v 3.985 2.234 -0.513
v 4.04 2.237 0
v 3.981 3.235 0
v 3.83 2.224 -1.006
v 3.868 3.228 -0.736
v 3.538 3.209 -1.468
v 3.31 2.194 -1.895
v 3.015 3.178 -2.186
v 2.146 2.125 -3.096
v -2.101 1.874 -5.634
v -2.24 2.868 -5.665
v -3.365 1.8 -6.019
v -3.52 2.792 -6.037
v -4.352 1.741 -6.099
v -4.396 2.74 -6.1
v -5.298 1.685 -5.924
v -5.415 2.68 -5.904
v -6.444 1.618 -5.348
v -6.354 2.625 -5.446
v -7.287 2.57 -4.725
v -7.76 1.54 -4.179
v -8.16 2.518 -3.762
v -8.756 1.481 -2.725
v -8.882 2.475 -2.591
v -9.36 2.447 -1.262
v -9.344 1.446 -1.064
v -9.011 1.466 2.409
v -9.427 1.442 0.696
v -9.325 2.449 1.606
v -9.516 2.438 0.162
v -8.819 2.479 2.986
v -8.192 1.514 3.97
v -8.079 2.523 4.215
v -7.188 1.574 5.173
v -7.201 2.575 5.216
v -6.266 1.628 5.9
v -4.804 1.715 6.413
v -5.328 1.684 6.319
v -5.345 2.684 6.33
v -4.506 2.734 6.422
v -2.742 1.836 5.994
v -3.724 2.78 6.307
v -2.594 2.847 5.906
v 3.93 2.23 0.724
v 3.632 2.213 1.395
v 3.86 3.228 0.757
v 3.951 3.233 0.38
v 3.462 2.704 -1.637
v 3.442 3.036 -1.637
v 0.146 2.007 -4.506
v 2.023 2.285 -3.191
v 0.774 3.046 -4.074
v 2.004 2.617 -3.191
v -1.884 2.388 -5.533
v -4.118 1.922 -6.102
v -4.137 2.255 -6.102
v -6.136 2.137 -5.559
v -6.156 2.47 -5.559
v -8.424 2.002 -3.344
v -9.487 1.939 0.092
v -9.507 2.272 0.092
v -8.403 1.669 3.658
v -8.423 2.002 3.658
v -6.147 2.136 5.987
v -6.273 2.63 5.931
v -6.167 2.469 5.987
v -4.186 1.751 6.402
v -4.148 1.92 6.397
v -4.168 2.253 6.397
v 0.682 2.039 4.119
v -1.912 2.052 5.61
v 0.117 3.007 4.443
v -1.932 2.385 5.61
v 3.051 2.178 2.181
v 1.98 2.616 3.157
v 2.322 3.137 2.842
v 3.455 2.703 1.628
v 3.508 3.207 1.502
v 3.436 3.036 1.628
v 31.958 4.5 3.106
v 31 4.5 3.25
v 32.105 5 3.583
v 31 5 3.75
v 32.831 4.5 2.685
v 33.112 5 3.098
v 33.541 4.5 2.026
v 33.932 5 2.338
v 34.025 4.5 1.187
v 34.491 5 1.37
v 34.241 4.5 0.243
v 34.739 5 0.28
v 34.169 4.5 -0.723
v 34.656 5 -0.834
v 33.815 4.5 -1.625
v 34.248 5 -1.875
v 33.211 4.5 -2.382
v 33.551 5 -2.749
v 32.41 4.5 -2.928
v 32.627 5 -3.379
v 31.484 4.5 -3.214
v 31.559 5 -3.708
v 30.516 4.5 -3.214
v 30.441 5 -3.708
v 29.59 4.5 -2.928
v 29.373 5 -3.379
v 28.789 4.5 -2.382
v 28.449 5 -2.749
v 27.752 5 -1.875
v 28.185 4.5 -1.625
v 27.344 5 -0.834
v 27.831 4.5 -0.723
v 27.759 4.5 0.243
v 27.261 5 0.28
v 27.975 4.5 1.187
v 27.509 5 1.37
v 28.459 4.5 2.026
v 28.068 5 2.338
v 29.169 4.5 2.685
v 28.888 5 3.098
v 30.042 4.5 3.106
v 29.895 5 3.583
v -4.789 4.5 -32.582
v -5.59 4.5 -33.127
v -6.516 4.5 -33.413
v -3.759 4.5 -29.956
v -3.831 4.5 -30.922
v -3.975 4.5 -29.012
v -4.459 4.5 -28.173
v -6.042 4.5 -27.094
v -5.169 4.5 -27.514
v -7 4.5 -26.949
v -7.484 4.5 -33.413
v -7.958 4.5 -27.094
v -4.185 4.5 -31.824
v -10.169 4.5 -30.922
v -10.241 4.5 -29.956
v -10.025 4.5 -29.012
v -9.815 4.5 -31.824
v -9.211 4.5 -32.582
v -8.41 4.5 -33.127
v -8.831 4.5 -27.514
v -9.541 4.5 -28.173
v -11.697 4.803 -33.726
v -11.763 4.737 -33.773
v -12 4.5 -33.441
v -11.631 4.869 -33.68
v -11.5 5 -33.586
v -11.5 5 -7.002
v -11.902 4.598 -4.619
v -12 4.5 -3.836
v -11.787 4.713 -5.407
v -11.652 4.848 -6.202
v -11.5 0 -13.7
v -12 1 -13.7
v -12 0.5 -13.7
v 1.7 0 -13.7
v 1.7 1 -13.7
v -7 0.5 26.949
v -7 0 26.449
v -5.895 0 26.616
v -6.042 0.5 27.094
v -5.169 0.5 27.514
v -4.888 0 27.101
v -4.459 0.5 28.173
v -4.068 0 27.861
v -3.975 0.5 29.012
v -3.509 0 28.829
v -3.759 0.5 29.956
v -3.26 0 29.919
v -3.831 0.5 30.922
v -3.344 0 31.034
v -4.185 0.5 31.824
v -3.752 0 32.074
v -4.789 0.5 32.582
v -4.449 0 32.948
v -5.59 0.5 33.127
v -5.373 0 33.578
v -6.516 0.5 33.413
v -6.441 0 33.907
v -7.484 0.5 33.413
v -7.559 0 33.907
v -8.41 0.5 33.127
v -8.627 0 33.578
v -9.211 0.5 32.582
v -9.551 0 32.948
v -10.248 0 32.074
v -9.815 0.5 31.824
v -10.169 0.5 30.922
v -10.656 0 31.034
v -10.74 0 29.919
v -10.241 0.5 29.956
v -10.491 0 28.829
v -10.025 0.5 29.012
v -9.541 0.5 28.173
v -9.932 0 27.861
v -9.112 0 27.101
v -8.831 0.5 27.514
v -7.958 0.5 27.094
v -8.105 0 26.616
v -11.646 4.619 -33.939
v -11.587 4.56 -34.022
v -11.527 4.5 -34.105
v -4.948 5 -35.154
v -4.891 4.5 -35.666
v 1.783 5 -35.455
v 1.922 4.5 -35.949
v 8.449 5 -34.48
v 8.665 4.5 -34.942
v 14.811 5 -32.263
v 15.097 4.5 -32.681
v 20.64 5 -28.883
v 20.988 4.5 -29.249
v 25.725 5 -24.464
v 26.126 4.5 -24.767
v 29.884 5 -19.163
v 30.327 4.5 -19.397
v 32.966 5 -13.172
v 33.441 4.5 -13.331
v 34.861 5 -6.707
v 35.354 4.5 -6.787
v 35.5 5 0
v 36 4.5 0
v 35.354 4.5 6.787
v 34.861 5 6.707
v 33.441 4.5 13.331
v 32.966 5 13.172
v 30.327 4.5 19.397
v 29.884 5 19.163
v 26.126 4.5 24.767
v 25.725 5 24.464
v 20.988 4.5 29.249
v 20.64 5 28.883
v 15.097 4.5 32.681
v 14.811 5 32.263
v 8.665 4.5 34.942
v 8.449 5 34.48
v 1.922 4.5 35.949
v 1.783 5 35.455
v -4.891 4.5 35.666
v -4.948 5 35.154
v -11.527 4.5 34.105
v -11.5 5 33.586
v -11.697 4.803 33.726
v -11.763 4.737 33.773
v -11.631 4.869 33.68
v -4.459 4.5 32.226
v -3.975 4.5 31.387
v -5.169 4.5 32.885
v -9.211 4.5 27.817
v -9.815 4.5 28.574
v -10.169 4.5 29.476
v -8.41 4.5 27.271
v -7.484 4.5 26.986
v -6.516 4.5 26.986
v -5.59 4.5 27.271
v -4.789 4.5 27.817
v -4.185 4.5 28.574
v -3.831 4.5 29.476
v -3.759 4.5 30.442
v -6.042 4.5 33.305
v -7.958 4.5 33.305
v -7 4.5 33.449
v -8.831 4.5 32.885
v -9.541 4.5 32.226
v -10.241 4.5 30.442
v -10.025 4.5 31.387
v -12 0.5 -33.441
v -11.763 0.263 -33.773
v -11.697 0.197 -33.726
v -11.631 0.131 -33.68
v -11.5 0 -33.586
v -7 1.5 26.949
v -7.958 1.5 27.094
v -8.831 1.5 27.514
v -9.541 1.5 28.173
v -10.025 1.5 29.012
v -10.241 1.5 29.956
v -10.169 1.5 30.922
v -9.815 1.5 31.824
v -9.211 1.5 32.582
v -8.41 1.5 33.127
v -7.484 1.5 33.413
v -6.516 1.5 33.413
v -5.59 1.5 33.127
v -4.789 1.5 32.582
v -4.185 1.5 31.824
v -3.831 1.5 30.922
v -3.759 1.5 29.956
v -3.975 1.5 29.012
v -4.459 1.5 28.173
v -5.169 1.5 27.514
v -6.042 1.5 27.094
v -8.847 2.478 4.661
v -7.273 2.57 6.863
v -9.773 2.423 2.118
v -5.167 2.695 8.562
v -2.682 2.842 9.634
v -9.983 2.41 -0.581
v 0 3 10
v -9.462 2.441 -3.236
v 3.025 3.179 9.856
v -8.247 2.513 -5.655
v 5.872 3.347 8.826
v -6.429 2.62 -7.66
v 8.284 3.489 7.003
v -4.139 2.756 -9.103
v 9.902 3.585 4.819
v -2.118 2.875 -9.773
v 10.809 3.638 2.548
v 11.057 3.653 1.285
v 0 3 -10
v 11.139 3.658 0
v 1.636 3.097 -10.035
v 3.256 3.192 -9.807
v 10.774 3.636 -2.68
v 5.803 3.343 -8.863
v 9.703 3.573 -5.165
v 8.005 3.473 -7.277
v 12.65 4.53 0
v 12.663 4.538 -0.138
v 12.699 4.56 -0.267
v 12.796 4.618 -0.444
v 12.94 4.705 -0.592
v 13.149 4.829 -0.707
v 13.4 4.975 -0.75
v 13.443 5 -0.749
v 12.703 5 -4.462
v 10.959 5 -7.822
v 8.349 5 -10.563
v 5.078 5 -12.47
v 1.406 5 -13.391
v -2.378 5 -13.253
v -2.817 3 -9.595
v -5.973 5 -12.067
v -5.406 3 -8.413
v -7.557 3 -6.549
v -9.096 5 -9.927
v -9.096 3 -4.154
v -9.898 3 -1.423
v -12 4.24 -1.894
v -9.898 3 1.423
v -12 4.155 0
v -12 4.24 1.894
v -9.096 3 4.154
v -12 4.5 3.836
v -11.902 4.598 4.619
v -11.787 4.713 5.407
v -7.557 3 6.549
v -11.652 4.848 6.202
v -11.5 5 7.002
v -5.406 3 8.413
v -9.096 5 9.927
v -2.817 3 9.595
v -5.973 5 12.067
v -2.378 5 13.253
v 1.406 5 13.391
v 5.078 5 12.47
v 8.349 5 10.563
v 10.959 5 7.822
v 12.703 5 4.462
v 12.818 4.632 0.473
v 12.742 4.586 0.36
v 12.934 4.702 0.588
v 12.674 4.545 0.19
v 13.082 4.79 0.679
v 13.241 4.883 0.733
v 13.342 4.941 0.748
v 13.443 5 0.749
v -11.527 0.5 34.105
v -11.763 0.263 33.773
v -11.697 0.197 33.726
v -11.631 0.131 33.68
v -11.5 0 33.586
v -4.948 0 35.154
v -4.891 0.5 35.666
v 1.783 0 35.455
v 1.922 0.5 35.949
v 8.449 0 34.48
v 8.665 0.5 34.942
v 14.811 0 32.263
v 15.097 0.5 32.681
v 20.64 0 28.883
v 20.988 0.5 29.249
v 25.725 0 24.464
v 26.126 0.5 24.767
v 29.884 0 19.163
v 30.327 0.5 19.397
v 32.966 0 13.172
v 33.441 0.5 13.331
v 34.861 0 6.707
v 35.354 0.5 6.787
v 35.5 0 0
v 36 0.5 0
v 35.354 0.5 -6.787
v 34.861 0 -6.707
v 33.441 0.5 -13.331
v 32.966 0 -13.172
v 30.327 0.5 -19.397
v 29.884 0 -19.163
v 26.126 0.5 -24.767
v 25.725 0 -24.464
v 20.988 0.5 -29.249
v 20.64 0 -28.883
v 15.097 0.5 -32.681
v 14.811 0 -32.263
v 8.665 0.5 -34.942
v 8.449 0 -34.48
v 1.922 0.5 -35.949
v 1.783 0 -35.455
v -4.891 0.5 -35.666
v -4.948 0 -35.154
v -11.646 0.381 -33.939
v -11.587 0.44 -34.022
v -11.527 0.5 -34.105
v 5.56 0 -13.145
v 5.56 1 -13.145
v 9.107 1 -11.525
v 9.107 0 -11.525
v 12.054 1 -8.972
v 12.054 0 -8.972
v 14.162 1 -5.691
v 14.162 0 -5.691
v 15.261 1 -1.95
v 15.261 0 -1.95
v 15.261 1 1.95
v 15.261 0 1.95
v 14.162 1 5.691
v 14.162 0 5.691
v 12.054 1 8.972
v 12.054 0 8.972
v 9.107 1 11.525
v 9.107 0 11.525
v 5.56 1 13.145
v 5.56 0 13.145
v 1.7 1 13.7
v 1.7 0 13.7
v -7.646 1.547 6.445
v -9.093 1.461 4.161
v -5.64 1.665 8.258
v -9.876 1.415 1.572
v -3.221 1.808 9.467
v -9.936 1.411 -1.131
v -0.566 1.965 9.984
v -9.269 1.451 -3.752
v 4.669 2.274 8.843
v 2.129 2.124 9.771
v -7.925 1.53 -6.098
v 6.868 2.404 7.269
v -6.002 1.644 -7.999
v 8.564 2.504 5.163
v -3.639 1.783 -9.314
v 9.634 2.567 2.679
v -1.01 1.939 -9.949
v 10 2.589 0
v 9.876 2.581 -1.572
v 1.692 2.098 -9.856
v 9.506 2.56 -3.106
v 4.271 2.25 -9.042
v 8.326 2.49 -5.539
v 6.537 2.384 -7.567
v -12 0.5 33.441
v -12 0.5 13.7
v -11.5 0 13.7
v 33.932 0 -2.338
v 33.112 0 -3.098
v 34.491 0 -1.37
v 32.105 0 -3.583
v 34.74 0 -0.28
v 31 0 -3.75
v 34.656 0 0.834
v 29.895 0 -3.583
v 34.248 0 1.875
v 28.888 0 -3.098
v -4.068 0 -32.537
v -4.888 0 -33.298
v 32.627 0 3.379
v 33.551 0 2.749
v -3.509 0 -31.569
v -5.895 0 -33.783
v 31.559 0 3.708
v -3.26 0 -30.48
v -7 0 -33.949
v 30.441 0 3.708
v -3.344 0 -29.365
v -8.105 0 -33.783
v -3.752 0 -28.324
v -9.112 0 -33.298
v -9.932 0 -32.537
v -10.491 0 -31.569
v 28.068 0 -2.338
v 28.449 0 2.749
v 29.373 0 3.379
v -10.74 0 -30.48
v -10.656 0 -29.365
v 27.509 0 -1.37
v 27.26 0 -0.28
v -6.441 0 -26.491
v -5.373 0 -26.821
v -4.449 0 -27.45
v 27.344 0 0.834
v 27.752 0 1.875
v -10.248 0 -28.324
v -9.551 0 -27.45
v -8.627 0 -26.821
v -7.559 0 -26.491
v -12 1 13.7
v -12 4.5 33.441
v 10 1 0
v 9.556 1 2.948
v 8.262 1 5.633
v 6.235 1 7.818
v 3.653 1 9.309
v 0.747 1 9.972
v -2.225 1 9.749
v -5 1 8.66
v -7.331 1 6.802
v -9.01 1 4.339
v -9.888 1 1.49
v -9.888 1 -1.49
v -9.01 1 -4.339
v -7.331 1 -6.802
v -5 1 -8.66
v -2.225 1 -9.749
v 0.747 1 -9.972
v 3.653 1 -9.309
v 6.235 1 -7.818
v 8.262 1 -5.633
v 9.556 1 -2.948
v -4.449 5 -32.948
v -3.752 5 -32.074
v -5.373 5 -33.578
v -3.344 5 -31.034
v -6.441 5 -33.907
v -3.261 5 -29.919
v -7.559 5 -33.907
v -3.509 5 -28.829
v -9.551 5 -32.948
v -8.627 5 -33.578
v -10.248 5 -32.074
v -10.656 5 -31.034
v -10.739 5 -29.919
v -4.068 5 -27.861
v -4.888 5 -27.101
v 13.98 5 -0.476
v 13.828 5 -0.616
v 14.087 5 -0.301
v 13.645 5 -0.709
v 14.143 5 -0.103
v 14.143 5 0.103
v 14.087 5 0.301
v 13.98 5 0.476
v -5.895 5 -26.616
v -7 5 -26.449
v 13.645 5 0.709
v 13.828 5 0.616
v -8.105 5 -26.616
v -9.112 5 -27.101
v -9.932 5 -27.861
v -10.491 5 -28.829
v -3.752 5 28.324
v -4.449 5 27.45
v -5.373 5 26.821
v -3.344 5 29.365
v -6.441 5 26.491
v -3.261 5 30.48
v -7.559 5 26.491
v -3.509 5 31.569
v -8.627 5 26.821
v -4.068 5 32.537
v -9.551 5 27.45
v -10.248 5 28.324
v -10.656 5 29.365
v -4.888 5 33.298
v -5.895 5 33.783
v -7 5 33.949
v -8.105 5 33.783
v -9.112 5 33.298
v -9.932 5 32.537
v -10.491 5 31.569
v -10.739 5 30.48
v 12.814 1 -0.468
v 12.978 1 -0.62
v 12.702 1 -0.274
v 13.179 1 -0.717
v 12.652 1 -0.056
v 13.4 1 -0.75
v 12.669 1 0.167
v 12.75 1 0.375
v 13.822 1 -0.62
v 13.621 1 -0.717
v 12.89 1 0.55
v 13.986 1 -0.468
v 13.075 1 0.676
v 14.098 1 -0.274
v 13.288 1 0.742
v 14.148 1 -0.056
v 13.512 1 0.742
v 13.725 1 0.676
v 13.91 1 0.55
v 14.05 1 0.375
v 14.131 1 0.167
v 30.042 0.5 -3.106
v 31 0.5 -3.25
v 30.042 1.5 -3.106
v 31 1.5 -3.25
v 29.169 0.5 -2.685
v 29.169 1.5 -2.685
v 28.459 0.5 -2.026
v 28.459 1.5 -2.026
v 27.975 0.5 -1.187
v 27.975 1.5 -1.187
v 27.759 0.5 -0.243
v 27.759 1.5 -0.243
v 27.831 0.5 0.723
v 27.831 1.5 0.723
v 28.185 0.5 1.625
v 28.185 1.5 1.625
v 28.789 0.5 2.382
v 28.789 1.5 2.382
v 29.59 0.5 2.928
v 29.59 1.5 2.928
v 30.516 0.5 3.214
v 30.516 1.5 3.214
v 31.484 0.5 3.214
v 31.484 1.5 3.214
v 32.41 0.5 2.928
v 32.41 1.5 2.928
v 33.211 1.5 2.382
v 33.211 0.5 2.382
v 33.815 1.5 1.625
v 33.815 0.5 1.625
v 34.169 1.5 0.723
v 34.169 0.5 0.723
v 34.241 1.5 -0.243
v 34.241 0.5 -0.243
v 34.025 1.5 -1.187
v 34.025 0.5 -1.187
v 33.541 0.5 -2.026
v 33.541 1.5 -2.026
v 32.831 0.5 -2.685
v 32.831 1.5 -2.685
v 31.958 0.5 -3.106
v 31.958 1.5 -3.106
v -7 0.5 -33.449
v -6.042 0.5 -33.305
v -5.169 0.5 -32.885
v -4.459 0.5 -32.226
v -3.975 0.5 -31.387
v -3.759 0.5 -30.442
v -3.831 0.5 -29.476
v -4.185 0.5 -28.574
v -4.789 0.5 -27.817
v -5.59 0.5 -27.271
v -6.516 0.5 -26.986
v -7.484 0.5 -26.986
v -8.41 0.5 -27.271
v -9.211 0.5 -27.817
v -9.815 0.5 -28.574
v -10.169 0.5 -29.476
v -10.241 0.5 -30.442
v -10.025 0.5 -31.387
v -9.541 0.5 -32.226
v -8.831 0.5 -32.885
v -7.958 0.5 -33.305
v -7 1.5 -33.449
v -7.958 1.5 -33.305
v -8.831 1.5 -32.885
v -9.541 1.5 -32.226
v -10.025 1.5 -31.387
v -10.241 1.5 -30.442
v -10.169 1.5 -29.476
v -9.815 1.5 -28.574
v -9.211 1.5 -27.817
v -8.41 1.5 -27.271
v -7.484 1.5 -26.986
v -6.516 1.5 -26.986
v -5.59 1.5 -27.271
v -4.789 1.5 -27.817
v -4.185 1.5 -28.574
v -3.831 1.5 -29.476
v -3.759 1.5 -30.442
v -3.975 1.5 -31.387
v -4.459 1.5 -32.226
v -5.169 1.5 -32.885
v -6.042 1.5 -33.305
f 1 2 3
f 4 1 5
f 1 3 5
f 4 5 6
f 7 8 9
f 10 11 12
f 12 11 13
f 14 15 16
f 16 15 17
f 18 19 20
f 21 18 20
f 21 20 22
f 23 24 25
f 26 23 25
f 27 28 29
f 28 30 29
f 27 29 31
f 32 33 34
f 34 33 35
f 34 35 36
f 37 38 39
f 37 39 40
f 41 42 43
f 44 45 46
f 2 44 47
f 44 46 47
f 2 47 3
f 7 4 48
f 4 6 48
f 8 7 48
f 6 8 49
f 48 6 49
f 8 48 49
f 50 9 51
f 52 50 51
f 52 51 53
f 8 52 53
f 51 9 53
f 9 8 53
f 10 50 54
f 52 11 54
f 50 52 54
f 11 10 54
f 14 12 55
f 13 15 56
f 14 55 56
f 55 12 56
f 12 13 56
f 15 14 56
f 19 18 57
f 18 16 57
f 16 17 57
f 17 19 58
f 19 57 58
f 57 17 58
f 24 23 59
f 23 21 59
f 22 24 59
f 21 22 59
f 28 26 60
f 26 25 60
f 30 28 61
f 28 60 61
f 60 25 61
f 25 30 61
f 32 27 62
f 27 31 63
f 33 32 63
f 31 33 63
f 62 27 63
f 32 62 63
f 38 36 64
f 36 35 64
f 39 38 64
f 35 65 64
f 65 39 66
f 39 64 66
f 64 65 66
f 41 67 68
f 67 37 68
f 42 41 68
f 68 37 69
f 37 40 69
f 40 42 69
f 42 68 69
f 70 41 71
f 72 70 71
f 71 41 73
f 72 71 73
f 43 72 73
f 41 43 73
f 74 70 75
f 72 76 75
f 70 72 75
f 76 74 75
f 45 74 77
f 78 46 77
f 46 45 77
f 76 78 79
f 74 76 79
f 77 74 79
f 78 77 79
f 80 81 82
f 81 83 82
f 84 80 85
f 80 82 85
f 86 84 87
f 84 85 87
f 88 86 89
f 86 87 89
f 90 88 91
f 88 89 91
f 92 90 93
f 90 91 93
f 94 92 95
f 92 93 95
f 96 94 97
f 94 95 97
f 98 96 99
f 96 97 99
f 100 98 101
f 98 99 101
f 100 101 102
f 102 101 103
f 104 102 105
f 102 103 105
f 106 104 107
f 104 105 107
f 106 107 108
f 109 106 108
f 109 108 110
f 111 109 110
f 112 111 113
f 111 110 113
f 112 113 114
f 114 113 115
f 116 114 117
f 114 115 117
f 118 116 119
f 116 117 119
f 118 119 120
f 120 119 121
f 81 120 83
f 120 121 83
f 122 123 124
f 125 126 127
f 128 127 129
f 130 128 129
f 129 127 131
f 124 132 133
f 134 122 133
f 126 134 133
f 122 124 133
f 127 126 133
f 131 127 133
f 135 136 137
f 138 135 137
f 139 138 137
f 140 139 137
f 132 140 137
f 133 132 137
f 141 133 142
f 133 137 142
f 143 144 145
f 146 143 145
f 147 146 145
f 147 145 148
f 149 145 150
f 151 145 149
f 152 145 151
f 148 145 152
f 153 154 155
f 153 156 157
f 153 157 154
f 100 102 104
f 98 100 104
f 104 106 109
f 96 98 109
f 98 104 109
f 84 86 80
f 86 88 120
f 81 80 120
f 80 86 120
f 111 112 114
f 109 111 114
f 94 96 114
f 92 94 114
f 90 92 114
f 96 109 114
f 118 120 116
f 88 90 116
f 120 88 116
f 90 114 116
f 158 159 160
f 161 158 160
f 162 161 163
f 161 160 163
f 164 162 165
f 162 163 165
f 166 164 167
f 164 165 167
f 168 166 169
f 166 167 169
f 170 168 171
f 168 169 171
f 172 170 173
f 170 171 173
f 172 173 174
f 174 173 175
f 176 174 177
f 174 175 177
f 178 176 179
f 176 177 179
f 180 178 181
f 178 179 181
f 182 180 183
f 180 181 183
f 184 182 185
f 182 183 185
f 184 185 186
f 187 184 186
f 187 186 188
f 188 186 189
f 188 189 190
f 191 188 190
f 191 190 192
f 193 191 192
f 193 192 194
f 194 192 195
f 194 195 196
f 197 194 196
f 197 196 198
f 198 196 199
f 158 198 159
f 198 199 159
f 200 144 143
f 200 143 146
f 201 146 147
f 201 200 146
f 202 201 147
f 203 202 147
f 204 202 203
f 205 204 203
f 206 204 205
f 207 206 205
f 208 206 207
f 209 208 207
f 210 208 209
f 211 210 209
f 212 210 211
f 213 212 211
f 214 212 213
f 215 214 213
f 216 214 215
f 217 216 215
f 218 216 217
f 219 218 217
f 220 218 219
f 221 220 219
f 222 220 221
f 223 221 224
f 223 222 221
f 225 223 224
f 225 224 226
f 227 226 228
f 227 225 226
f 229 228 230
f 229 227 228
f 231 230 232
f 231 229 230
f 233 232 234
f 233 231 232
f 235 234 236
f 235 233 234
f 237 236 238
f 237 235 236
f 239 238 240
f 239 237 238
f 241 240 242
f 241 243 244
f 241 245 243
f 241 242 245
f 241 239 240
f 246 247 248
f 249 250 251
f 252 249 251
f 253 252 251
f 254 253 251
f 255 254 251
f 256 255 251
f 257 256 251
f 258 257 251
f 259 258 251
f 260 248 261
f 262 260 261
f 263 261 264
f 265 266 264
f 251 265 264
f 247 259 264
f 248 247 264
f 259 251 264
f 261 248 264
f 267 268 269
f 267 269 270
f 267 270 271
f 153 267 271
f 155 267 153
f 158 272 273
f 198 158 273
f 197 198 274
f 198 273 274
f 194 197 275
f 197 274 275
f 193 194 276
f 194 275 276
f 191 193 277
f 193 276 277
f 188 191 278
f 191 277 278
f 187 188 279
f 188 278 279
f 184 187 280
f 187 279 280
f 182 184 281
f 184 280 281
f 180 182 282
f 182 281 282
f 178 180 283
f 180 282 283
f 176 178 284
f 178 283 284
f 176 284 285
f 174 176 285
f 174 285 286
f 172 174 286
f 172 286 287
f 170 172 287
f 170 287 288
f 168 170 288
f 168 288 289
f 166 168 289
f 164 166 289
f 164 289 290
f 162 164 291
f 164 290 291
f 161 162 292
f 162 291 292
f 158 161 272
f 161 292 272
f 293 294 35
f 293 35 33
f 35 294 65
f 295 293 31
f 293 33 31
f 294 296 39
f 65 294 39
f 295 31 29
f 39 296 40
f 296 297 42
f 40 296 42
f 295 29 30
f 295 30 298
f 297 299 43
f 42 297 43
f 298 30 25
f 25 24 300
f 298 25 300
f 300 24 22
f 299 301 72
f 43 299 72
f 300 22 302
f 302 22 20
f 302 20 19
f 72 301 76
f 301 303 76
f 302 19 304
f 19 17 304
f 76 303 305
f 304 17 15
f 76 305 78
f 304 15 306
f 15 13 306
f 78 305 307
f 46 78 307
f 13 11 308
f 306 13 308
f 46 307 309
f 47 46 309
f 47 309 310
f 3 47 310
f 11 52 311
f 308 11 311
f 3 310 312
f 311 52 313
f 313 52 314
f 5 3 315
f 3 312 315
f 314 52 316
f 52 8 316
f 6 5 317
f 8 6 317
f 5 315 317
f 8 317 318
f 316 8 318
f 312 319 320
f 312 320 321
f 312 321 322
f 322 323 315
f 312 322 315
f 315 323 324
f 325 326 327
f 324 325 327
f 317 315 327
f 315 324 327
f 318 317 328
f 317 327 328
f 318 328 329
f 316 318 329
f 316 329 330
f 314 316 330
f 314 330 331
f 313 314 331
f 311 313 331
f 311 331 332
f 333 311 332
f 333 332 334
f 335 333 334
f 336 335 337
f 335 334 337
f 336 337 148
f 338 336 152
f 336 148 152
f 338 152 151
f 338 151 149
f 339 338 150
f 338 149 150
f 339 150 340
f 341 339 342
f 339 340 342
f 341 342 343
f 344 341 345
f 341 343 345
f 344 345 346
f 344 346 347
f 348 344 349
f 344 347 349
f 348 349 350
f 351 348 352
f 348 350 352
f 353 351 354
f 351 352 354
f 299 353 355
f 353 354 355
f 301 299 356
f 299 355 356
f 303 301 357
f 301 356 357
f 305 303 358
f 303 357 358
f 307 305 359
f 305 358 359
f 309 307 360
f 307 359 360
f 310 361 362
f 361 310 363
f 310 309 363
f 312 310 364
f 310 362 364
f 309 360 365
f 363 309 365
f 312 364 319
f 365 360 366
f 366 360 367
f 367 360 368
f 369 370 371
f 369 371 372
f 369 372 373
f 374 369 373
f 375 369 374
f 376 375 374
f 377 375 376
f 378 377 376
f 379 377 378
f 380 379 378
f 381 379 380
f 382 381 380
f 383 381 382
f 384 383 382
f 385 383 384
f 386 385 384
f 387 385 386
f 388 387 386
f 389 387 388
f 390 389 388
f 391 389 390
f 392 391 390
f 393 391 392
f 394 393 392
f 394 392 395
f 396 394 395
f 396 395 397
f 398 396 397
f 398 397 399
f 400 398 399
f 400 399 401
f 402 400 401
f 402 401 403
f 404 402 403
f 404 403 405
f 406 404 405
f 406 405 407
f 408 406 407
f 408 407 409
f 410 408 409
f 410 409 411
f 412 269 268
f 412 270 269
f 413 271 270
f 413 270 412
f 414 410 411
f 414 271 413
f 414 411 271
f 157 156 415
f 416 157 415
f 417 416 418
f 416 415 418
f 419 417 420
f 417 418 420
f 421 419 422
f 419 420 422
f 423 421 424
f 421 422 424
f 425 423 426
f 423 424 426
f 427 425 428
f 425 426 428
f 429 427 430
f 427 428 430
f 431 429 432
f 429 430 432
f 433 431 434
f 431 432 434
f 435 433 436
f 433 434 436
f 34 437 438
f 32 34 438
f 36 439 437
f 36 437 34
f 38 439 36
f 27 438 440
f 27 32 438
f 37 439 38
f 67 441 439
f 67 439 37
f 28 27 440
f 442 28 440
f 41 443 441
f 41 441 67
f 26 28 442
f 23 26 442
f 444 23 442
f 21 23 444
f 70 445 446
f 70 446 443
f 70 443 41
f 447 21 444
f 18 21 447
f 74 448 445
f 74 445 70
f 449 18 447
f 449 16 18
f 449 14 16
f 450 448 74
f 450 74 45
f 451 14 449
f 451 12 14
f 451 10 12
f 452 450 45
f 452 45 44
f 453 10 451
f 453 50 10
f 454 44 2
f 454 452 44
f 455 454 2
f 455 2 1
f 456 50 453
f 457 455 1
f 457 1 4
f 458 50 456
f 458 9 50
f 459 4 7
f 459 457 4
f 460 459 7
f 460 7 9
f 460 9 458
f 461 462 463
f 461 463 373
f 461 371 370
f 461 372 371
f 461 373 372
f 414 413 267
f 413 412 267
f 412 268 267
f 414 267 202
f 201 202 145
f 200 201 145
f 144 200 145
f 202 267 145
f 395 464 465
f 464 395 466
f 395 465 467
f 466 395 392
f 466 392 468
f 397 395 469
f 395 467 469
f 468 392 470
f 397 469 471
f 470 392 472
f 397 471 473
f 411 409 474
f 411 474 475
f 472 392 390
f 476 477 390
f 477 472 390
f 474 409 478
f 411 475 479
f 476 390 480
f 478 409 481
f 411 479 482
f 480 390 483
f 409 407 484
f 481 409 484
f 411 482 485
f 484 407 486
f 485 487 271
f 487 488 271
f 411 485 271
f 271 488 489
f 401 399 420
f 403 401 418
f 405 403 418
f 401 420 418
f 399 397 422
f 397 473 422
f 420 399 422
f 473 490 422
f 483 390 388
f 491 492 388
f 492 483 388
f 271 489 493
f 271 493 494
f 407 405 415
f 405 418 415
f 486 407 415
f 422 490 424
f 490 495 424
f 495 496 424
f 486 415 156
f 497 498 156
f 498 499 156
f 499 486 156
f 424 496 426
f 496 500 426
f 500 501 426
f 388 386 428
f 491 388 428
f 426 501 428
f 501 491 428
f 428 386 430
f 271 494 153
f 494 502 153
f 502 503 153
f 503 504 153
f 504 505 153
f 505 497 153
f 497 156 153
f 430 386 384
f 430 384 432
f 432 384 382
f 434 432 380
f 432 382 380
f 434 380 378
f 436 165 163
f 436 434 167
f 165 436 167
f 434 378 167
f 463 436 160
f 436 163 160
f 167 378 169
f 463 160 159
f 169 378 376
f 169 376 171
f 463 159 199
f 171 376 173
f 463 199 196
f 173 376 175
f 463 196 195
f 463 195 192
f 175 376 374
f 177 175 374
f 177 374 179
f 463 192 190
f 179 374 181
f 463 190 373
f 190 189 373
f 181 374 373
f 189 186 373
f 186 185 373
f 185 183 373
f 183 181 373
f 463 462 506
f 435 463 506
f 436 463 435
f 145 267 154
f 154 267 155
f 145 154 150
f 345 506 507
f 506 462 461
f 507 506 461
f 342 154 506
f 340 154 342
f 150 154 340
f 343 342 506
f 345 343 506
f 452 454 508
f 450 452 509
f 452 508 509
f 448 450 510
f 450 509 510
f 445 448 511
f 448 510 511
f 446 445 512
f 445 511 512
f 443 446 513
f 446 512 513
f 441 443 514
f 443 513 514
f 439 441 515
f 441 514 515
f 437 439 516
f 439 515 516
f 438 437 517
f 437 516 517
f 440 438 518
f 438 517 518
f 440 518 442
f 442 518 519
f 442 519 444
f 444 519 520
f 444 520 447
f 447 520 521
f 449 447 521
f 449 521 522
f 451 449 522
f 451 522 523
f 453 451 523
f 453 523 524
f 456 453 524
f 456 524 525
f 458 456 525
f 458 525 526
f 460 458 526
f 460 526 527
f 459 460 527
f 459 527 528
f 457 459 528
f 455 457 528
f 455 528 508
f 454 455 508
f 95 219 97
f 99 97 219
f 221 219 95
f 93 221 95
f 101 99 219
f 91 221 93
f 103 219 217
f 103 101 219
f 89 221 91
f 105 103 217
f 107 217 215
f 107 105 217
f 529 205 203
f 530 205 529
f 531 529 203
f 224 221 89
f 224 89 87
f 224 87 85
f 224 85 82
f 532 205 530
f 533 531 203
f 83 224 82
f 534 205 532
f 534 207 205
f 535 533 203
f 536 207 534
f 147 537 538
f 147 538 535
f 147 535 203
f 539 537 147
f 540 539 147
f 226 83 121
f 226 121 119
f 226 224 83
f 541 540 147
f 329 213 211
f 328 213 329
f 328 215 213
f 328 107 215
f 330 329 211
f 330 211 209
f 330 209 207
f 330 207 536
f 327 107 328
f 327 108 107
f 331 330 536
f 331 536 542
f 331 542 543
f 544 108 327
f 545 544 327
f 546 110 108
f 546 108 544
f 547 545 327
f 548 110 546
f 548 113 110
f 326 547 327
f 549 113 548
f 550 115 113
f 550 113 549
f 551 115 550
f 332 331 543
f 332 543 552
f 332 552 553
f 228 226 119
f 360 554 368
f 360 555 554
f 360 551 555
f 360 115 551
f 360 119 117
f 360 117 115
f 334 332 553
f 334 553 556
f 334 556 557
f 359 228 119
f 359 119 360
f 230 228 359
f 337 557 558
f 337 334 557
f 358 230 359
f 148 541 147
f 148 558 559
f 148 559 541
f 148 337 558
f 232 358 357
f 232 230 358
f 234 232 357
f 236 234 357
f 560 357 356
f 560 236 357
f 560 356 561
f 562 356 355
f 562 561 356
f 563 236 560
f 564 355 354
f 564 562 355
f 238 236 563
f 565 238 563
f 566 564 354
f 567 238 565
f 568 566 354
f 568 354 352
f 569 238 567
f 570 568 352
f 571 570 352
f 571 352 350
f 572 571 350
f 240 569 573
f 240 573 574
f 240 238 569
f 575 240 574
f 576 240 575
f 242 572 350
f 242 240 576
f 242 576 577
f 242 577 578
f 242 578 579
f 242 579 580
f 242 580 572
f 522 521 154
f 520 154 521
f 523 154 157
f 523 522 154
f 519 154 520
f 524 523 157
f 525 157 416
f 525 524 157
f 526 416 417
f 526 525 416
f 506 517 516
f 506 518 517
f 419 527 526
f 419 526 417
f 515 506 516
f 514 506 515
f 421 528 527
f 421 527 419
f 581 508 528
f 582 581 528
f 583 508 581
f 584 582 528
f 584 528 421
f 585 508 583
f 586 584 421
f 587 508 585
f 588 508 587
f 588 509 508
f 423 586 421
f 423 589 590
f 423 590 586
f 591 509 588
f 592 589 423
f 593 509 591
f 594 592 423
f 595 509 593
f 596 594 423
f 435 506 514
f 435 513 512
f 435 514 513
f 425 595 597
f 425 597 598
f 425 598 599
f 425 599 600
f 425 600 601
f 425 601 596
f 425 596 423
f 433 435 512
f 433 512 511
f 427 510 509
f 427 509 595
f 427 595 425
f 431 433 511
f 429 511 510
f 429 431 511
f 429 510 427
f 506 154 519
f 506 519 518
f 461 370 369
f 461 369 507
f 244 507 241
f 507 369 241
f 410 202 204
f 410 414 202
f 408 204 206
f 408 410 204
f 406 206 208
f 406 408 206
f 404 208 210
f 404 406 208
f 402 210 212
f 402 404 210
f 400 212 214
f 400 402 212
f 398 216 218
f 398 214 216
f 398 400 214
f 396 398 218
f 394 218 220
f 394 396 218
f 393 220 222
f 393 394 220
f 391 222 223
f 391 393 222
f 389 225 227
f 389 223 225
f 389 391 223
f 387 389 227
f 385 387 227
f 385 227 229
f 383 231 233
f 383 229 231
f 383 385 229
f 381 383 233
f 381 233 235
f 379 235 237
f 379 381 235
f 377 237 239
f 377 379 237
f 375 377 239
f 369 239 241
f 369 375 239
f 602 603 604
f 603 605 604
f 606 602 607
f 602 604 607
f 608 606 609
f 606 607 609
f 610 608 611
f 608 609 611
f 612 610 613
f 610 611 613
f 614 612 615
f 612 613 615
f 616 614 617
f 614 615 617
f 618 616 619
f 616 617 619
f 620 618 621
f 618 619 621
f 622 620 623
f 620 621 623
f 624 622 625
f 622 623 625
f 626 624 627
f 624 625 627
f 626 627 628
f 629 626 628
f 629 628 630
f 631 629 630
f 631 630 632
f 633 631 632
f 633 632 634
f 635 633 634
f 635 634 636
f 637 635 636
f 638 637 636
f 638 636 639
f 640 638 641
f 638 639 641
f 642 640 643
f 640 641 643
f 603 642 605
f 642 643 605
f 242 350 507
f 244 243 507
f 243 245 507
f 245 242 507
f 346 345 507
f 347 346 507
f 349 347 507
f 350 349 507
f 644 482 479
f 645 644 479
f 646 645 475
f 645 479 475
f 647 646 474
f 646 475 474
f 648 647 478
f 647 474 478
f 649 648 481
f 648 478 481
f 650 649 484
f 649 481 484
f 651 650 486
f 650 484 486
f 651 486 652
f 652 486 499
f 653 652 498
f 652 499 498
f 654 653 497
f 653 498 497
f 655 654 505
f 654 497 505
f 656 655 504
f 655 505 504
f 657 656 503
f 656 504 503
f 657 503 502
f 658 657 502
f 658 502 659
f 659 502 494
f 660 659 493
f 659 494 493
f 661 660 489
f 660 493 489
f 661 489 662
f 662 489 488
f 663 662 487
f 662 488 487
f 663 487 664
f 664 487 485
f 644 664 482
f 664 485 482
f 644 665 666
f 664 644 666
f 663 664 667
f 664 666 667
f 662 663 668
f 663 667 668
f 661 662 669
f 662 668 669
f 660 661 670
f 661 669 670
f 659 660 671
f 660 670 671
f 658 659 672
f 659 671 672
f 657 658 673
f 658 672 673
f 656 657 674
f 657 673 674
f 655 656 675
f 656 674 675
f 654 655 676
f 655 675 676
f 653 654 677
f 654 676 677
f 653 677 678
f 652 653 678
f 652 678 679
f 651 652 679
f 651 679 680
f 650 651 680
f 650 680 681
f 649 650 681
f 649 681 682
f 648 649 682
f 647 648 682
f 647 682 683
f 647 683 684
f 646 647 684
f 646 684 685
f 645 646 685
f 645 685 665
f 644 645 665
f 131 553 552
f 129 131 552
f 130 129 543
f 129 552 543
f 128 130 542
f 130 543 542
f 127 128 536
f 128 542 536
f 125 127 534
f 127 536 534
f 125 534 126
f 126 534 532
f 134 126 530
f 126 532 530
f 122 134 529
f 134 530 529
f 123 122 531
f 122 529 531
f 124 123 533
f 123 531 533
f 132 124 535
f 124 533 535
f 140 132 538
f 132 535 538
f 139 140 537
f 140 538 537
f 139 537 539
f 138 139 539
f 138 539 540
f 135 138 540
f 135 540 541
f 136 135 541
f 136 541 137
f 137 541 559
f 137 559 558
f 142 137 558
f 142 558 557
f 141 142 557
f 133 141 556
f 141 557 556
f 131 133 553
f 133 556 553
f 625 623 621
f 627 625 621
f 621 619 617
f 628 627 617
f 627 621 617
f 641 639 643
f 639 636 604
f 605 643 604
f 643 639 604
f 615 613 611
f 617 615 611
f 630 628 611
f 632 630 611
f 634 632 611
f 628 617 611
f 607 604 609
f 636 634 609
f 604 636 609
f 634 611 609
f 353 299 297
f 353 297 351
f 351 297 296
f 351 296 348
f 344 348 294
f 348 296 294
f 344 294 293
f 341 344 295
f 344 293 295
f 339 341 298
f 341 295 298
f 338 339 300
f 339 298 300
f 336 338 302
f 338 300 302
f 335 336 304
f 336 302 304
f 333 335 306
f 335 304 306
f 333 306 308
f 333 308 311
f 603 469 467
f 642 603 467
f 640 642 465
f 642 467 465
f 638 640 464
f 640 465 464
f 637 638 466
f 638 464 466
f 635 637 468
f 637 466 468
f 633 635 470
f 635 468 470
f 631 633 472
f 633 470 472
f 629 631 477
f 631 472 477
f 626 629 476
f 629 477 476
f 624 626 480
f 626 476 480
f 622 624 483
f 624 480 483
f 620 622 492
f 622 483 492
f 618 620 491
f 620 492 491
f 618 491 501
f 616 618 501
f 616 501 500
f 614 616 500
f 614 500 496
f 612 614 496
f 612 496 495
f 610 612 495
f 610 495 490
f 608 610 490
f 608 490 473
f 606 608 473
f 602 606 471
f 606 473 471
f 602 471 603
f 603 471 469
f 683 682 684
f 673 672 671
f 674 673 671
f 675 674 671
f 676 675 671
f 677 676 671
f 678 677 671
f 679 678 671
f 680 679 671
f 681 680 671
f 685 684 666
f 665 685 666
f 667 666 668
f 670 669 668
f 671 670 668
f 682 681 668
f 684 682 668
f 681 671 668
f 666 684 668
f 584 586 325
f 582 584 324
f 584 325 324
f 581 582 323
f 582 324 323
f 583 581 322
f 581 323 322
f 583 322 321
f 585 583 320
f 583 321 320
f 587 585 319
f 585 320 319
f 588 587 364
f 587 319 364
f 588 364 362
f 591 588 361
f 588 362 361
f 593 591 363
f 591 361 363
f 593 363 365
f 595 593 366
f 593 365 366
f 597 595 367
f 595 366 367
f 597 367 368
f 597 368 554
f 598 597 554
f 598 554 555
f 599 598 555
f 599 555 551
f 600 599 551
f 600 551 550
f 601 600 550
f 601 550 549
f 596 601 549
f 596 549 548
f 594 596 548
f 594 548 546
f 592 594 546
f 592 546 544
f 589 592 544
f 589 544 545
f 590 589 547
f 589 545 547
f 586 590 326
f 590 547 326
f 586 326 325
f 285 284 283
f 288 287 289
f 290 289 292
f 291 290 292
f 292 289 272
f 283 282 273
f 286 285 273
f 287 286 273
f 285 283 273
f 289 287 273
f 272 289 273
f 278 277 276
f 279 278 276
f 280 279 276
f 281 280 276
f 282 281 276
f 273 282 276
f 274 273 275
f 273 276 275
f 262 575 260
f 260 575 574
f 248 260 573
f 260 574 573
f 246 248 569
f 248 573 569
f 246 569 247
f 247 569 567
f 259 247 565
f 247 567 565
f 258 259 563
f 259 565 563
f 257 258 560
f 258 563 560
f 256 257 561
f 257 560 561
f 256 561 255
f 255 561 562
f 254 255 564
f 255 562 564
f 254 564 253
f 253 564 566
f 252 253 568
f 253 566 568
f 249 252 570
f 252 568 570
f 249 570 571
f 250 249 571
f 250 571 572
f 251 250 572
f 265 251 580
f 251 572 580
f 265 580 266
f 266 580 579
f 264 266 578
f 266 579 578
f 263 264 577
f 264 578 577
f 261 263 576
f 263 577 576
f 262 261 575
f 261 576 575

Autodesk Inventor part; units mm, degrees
ref_plane "YZ Plane" through (0, 0, 0) normal (1, 0, 0) x (0, 1, 0)
ref_plane "Bottom Plane for Slope" through (0, 1.5, 0) normal (0, 1, 0) x (-1, 0, 0)
sketch "Bottom Plane" plane through (0, 1.5, 0) normal (0, 1, 0) x (-1, 0, 0)
  line L0 (-25.4, 25.4) -> (25.4, 25.4)
  line L1 (25.4, 25.4) -> (25.4, -25.4)
  line L2 (25.4, -25.4) -> (-25.4, -25.4)
  line L3 (-25.4, -25.4) -> (-25.4, 25.4)
  line L4 (-25.4, 25.4) -> (25.4, -25.4) construction
  line L5 (25.4, 25.4) -> (-25.4, -25.4) construction
  point P0 (0, 0)
  dimension "d26" = 50.8
  dimension "d27" = 50.8
ref_plane "Top Plane for Slope" through (0, 4.5, 0) normal (0, 1, 0) x (-1, 0, 0)
sketch "Top Plane" plane through (0, 4.5, 0) normal (0, 1, 0) x (-1, 0, 0)
  line L0 (-25.4, 25.4) -> (25.4, 25.4)
  line L1 (25.4, 25.4) -> (25.4, -25.4)
  line L2 (25.4, -25.4) -> (-25.4, -25.4)
  line L3 (-25.4, -25.4) -> (-25.4, 25.4)
  line L4 (-25.4, 25.4) -> (25.4, -25.4) construction
  line L5 (25.4, 25.4) -> (-25.4, -25.4) construction
  point P0 (0, 0)
  dimension "d28" = 50.8
  dimension "d29" = 50.8
ref_plane "Slope Plane" through (-25.4, 1.5, 25.4) normal (0.0589524, -0.9982608, 0) x (0, 0, -1)
sketch "master" plane through (0, 0, 0) normal (0, 1, 0) x (-1, 0, 0)
  circle A0 centre (0, 0) radius 36
  line L0 (0, 36) -> (0, -36) construction
  line L1 (12, -33.9411) -> (12, 33.9411)
  circle A1 centre (0, 0) radius 10 construction
  line L2 (10, 0) -> (12, 0) construction
  circle A2 centre (-1.7, 0) radius 13.7 construction
  line L3 (-36, 0) -> (12, 0) construction
  circle A3 centre (0, 0) radius 31 construction
  line L4 (7, -35.3129) -> (7, 35.3129) construction
  line L5 (0, 0) -> (-23.1404, -27.5776) construction
  line L6 (0, 0) -> (-23.1404, 27.5776) construction
  circle A4 centre (-1.7, 0) radius 11.7 construction
  line L7 (-1.7, -13.7) -> (-1.7, 13.7) construction
  line L8 (-1.7, -13.7) -> (12, -13.7) construction
  line L9 (-1.7, 13.7) -> (12, 13.7) construction
  point P0 (7, -30.1993)
  point P1 (7, 30.1993)
  point P2 (-19.9264, -23.7474)
  point P3 (-19.9264, 23.7474)
  point P4 (-31, 0)
  point P5 (0, -11.5758)
  point P6 (0, 11.5758)
  point P7 (-13.4, 0)
  dimension "d0" = 72
  dimension "d2" = 20
  dimension "d1" = 2
  dimension "d6" = 27.4
  dimension "d7" = 5
  dimension "d8" = 5
  dimension "d9" = 50
  dimension "d10" = 50
  dimension "d11" = 2
extrude "Main Platform" add sketch "master" along normal blind 5 contours L1 A0 picked at (-3.9243, -1.3458)
sketch "Sketch3" plane through (0, 0, 0) normal (0, -1, 0) x (1, 0, 0)
  circle A0 centre (0, 0) radius 10 construction
  circle A1 centre (0, 0) radius 10
extrude "Main Hole" cut sketch "Sketch3" against normal blind 5
sketch "Sketch4" plane through (0, 0, 0) normal (0, -1, 0) x (1, 0, 0)
  circle A0 centre (1.7, 0) radius 13.7 construction
  circle A1 centre (1.7, 0) radius 13.7
  line L0 (1.7, 13.7) -> (-12, 13.7) construction
  line L1 (1.7, -13.7) -> (-12, -13.7) construction
  line L2 (-12, 13.7) -> (1.7, 13.7)
  line L3 (1.7, 13.7) -> (1.7, -13.7)
  line L4 (1.7, -13.7) -> (-12, -13.7)
  line L5 (-12, -13.7) -> (-12, 13.7)
  point P0 (0, 0)
extrude "Window Recess" cut sketch "Sketch4" against normal blind 1
sketch "Sketch5" plane through (0, 0, 0) normal (0, -1, 0) x (1, 0, 0)
  point P0 (0, 0)
  point P1 (13.4, 0)
hole "Window Removal Holes" at (13.4, 0, 0) direction (0, 1, 0) diameter 1.5 end through all
sketch "Sketch10" plane through (-25.4, 1.5, 25.4) normal (0.0589524, -0.9982608, 0) x (0, 0, -1)
  ellipse E0 centre (25.4, 27.0234) end of major axis (11.7, 27.0234) minor radius 13.6762 (39.1, 27.0234) -> (11.7, 27.0234) ccw construction
  line L0 (11.7, 13.3472) -> (11.7, 27.0234) construction
  line L1 (39.1, 27.0234) -> (39.1, 13.3472) construction
  ellipse E1 centre (25.4, 25.5622) end of major axis (35.4, 25.5622) minor radius 9.9826 construction
  line L2 (59.3411, 13.583) -> (-8.5411, 13.583) construction
  line L3 (39.1, 26.9644) -> (39.1, 13.2883) projected
  line L4 (39.1, 14.351) -> (11.7, 14.351)
  line L5 (11.7, 14.351) -> (11.7, 35.7061)
  line L6 (11.7, 35.7061) -> (39.1, 35.7061)
  line L7 (39.1, 35.7061) -> (39.1, 14.351)
  point P0 (25.4, 25.2674)
extrude "Slope" add sketch "Sketch10" along normal blind 1
sketch "Sketch14" plane through (0, 0, 0) normal (0, -1, 0) x (1, 0, 0)
  point P0 (0, 0)
  point P1 (-7, 30.1993)
  point P2 (31, 0)
  point P3 (-7, -30.1993)
chamfer "Chamfer1" distance 2 angle 60 1 edges at (-10, 5, 0)
sketch "Sketch17" plane through (-25.4, 1.5, 25.4) normal (0.0589524, -0.9982608, 0) x (0, 0, -1)
  ellipse E0 centre (25.4, 25.4443) end of major axis (25.4, 15.4268) minor radius 10 (15.4, 25.4443) -> (35.4, 25.4443) ccw construction
  ellipse E1 centre (25.4, 26.4797) end of major axis (25.4, 36.6031) minor radius 10.0527 (35.4, 25.4443) -> (15.4, 25.4443) ccw construction
  ellipse E2 centre (25.4, 25.3852) end of major axis (25.4, 15.3678) minor radius 10 construction
  ellipse E3 centre (25.4, 25.4443) end of major axis (35.4, 25.4443) minor radius 9.9826 (15.4, 25.4443) -> (35.4, 25.4443) ccw construction
  line L0 (25.4, 35.4026) -> (32.7708, 19.5959) construction
  line L1 (25.4, 35.4026) -> (18.0292, 19.5959) construction
  line L2 (25.4, 35.4026) -> (25.4, 19.5959) construction
  line L3 (32.7708, 19.5959) -> (18.0292, 19.5959) construction
  line L4 (28.184, 29.4323) -> (22.616, 29.4323) construction
  line L5 (58.9857, 14.0822) -> (-8.1857, 14.0822) construction
  line L6 (-8.1857, 14.0822) -> (-8.1857, 35.4026) construction
  line L7 (-8.1857, 35.4026) -> (58.9857, 35.4026) construction
  line L8 (58.9857, 35.4026) -> (58.9857, 14.0822) construction
  spline S0 degree 5 poles (25.4, 29.4323) (26.7138, 29.432) (28.9448, 27.9113) (31.9512, 21.8517) (32.9232, 20.462) (25.6746, 12.422) (16.6165, 20.5026) (19.1302, 21.7816) (21.8974, 27.8954) (24.0775, 29.4325) (25.4, 29.4323) knots 0 0 0 0 0 0 0.199988 0.334999 0.499228 0.663457 0.798679 1 1 1 1 1 1
  line L9 (30.5619, 24.333) -> (20.2381, 24.333) construction
  line L10 (25.4, 19.5959) -> (25.4, 13.3472) construction
  line L11 (39.1, 13.3472) -> (11.7, 13.3472) projected
  point P0 (25.4, 25.2674)
  point P1 (25.4, 15.9117)
  point P2 (19.2424, 19.5959)
  dimension "d81" = 25
  dimension "d82" = 25
extrude "Extrusion6" cut sketch "Sketch17" along normal through all
sketch "Sketch15" plane through (0, 5, 0) normal (0, 1, 0) x (1, 0, 0)
  point P0 (0, 0)
  point P1 (31, 0)
  point P2 (-7, -30.1993)
  point P3 (-7, 30.1993)
hole "Top Magnet Holes" at (-7, 5, -30.1993) at (31, 5, 0) at (-7, 5, 30.1993) direction (0, -1, 0) diameter 6.5 depth 0.5
hole "Bottom Magnet Holes" at (-7, 0, 30.1993) at (31, 0, 0) at (-7, 0, -30.1993) direction (0, 1, 0) diameter 6.5 depth 1.5
chamfer "Chamfer7" distance 0.5 angle 45 1 edges at (-12, 2.5, 33.9411)
chamfer "Chamfer8" distance 0.5 angle 45 1 edges at (-12, 2.5, -33.9411)
chamfer "Chamfer9" distance 0.5 angle 45 1 edges at (-12, 5, -19.7735)
chamfer "Chamfer10" distance 0.5 angle 45 1 edges at (-12, 5, 19.7735)
chamfer "Chamfer11" distance 0.5 angle 45 1 edges at (-12, 0, 23.5706)
chamfer "Chamfer12" distance 0.5 angle 45 1 edges at (-12, 0, -23.5706)
chamfer "Chamfer13" distance 0.5 angle 45 1 edges at (36, 5, 0)
chamfer "Chamfer14" distance 0.5 angle 45 1 edges at (36, 0, 0)
chamfer "Chamfer15" distance 0.5 angle 45 1 edges at (-7, 5, -33.4493)
chamfer "Chamfer16" distance 0.5 angle 45 1 edges at (31, 5, -3.25)
chamfer "Chamfer17" distance 0.5 angle 45 1 edges at (-7, 5, 26.9493)
chamfer "Chamfer18" distance 0.5 angle 45 1 edges at (-7, 0, 33.4493)
chamfer "Chamfer19" distance 0.5 angle 45 1 edges at (31, 0, 3.25)
chamfer "Chamfer20" distance 0.5 angle 45 1 edges at (-7, 0, -26.9493)
properties part number "holder"
